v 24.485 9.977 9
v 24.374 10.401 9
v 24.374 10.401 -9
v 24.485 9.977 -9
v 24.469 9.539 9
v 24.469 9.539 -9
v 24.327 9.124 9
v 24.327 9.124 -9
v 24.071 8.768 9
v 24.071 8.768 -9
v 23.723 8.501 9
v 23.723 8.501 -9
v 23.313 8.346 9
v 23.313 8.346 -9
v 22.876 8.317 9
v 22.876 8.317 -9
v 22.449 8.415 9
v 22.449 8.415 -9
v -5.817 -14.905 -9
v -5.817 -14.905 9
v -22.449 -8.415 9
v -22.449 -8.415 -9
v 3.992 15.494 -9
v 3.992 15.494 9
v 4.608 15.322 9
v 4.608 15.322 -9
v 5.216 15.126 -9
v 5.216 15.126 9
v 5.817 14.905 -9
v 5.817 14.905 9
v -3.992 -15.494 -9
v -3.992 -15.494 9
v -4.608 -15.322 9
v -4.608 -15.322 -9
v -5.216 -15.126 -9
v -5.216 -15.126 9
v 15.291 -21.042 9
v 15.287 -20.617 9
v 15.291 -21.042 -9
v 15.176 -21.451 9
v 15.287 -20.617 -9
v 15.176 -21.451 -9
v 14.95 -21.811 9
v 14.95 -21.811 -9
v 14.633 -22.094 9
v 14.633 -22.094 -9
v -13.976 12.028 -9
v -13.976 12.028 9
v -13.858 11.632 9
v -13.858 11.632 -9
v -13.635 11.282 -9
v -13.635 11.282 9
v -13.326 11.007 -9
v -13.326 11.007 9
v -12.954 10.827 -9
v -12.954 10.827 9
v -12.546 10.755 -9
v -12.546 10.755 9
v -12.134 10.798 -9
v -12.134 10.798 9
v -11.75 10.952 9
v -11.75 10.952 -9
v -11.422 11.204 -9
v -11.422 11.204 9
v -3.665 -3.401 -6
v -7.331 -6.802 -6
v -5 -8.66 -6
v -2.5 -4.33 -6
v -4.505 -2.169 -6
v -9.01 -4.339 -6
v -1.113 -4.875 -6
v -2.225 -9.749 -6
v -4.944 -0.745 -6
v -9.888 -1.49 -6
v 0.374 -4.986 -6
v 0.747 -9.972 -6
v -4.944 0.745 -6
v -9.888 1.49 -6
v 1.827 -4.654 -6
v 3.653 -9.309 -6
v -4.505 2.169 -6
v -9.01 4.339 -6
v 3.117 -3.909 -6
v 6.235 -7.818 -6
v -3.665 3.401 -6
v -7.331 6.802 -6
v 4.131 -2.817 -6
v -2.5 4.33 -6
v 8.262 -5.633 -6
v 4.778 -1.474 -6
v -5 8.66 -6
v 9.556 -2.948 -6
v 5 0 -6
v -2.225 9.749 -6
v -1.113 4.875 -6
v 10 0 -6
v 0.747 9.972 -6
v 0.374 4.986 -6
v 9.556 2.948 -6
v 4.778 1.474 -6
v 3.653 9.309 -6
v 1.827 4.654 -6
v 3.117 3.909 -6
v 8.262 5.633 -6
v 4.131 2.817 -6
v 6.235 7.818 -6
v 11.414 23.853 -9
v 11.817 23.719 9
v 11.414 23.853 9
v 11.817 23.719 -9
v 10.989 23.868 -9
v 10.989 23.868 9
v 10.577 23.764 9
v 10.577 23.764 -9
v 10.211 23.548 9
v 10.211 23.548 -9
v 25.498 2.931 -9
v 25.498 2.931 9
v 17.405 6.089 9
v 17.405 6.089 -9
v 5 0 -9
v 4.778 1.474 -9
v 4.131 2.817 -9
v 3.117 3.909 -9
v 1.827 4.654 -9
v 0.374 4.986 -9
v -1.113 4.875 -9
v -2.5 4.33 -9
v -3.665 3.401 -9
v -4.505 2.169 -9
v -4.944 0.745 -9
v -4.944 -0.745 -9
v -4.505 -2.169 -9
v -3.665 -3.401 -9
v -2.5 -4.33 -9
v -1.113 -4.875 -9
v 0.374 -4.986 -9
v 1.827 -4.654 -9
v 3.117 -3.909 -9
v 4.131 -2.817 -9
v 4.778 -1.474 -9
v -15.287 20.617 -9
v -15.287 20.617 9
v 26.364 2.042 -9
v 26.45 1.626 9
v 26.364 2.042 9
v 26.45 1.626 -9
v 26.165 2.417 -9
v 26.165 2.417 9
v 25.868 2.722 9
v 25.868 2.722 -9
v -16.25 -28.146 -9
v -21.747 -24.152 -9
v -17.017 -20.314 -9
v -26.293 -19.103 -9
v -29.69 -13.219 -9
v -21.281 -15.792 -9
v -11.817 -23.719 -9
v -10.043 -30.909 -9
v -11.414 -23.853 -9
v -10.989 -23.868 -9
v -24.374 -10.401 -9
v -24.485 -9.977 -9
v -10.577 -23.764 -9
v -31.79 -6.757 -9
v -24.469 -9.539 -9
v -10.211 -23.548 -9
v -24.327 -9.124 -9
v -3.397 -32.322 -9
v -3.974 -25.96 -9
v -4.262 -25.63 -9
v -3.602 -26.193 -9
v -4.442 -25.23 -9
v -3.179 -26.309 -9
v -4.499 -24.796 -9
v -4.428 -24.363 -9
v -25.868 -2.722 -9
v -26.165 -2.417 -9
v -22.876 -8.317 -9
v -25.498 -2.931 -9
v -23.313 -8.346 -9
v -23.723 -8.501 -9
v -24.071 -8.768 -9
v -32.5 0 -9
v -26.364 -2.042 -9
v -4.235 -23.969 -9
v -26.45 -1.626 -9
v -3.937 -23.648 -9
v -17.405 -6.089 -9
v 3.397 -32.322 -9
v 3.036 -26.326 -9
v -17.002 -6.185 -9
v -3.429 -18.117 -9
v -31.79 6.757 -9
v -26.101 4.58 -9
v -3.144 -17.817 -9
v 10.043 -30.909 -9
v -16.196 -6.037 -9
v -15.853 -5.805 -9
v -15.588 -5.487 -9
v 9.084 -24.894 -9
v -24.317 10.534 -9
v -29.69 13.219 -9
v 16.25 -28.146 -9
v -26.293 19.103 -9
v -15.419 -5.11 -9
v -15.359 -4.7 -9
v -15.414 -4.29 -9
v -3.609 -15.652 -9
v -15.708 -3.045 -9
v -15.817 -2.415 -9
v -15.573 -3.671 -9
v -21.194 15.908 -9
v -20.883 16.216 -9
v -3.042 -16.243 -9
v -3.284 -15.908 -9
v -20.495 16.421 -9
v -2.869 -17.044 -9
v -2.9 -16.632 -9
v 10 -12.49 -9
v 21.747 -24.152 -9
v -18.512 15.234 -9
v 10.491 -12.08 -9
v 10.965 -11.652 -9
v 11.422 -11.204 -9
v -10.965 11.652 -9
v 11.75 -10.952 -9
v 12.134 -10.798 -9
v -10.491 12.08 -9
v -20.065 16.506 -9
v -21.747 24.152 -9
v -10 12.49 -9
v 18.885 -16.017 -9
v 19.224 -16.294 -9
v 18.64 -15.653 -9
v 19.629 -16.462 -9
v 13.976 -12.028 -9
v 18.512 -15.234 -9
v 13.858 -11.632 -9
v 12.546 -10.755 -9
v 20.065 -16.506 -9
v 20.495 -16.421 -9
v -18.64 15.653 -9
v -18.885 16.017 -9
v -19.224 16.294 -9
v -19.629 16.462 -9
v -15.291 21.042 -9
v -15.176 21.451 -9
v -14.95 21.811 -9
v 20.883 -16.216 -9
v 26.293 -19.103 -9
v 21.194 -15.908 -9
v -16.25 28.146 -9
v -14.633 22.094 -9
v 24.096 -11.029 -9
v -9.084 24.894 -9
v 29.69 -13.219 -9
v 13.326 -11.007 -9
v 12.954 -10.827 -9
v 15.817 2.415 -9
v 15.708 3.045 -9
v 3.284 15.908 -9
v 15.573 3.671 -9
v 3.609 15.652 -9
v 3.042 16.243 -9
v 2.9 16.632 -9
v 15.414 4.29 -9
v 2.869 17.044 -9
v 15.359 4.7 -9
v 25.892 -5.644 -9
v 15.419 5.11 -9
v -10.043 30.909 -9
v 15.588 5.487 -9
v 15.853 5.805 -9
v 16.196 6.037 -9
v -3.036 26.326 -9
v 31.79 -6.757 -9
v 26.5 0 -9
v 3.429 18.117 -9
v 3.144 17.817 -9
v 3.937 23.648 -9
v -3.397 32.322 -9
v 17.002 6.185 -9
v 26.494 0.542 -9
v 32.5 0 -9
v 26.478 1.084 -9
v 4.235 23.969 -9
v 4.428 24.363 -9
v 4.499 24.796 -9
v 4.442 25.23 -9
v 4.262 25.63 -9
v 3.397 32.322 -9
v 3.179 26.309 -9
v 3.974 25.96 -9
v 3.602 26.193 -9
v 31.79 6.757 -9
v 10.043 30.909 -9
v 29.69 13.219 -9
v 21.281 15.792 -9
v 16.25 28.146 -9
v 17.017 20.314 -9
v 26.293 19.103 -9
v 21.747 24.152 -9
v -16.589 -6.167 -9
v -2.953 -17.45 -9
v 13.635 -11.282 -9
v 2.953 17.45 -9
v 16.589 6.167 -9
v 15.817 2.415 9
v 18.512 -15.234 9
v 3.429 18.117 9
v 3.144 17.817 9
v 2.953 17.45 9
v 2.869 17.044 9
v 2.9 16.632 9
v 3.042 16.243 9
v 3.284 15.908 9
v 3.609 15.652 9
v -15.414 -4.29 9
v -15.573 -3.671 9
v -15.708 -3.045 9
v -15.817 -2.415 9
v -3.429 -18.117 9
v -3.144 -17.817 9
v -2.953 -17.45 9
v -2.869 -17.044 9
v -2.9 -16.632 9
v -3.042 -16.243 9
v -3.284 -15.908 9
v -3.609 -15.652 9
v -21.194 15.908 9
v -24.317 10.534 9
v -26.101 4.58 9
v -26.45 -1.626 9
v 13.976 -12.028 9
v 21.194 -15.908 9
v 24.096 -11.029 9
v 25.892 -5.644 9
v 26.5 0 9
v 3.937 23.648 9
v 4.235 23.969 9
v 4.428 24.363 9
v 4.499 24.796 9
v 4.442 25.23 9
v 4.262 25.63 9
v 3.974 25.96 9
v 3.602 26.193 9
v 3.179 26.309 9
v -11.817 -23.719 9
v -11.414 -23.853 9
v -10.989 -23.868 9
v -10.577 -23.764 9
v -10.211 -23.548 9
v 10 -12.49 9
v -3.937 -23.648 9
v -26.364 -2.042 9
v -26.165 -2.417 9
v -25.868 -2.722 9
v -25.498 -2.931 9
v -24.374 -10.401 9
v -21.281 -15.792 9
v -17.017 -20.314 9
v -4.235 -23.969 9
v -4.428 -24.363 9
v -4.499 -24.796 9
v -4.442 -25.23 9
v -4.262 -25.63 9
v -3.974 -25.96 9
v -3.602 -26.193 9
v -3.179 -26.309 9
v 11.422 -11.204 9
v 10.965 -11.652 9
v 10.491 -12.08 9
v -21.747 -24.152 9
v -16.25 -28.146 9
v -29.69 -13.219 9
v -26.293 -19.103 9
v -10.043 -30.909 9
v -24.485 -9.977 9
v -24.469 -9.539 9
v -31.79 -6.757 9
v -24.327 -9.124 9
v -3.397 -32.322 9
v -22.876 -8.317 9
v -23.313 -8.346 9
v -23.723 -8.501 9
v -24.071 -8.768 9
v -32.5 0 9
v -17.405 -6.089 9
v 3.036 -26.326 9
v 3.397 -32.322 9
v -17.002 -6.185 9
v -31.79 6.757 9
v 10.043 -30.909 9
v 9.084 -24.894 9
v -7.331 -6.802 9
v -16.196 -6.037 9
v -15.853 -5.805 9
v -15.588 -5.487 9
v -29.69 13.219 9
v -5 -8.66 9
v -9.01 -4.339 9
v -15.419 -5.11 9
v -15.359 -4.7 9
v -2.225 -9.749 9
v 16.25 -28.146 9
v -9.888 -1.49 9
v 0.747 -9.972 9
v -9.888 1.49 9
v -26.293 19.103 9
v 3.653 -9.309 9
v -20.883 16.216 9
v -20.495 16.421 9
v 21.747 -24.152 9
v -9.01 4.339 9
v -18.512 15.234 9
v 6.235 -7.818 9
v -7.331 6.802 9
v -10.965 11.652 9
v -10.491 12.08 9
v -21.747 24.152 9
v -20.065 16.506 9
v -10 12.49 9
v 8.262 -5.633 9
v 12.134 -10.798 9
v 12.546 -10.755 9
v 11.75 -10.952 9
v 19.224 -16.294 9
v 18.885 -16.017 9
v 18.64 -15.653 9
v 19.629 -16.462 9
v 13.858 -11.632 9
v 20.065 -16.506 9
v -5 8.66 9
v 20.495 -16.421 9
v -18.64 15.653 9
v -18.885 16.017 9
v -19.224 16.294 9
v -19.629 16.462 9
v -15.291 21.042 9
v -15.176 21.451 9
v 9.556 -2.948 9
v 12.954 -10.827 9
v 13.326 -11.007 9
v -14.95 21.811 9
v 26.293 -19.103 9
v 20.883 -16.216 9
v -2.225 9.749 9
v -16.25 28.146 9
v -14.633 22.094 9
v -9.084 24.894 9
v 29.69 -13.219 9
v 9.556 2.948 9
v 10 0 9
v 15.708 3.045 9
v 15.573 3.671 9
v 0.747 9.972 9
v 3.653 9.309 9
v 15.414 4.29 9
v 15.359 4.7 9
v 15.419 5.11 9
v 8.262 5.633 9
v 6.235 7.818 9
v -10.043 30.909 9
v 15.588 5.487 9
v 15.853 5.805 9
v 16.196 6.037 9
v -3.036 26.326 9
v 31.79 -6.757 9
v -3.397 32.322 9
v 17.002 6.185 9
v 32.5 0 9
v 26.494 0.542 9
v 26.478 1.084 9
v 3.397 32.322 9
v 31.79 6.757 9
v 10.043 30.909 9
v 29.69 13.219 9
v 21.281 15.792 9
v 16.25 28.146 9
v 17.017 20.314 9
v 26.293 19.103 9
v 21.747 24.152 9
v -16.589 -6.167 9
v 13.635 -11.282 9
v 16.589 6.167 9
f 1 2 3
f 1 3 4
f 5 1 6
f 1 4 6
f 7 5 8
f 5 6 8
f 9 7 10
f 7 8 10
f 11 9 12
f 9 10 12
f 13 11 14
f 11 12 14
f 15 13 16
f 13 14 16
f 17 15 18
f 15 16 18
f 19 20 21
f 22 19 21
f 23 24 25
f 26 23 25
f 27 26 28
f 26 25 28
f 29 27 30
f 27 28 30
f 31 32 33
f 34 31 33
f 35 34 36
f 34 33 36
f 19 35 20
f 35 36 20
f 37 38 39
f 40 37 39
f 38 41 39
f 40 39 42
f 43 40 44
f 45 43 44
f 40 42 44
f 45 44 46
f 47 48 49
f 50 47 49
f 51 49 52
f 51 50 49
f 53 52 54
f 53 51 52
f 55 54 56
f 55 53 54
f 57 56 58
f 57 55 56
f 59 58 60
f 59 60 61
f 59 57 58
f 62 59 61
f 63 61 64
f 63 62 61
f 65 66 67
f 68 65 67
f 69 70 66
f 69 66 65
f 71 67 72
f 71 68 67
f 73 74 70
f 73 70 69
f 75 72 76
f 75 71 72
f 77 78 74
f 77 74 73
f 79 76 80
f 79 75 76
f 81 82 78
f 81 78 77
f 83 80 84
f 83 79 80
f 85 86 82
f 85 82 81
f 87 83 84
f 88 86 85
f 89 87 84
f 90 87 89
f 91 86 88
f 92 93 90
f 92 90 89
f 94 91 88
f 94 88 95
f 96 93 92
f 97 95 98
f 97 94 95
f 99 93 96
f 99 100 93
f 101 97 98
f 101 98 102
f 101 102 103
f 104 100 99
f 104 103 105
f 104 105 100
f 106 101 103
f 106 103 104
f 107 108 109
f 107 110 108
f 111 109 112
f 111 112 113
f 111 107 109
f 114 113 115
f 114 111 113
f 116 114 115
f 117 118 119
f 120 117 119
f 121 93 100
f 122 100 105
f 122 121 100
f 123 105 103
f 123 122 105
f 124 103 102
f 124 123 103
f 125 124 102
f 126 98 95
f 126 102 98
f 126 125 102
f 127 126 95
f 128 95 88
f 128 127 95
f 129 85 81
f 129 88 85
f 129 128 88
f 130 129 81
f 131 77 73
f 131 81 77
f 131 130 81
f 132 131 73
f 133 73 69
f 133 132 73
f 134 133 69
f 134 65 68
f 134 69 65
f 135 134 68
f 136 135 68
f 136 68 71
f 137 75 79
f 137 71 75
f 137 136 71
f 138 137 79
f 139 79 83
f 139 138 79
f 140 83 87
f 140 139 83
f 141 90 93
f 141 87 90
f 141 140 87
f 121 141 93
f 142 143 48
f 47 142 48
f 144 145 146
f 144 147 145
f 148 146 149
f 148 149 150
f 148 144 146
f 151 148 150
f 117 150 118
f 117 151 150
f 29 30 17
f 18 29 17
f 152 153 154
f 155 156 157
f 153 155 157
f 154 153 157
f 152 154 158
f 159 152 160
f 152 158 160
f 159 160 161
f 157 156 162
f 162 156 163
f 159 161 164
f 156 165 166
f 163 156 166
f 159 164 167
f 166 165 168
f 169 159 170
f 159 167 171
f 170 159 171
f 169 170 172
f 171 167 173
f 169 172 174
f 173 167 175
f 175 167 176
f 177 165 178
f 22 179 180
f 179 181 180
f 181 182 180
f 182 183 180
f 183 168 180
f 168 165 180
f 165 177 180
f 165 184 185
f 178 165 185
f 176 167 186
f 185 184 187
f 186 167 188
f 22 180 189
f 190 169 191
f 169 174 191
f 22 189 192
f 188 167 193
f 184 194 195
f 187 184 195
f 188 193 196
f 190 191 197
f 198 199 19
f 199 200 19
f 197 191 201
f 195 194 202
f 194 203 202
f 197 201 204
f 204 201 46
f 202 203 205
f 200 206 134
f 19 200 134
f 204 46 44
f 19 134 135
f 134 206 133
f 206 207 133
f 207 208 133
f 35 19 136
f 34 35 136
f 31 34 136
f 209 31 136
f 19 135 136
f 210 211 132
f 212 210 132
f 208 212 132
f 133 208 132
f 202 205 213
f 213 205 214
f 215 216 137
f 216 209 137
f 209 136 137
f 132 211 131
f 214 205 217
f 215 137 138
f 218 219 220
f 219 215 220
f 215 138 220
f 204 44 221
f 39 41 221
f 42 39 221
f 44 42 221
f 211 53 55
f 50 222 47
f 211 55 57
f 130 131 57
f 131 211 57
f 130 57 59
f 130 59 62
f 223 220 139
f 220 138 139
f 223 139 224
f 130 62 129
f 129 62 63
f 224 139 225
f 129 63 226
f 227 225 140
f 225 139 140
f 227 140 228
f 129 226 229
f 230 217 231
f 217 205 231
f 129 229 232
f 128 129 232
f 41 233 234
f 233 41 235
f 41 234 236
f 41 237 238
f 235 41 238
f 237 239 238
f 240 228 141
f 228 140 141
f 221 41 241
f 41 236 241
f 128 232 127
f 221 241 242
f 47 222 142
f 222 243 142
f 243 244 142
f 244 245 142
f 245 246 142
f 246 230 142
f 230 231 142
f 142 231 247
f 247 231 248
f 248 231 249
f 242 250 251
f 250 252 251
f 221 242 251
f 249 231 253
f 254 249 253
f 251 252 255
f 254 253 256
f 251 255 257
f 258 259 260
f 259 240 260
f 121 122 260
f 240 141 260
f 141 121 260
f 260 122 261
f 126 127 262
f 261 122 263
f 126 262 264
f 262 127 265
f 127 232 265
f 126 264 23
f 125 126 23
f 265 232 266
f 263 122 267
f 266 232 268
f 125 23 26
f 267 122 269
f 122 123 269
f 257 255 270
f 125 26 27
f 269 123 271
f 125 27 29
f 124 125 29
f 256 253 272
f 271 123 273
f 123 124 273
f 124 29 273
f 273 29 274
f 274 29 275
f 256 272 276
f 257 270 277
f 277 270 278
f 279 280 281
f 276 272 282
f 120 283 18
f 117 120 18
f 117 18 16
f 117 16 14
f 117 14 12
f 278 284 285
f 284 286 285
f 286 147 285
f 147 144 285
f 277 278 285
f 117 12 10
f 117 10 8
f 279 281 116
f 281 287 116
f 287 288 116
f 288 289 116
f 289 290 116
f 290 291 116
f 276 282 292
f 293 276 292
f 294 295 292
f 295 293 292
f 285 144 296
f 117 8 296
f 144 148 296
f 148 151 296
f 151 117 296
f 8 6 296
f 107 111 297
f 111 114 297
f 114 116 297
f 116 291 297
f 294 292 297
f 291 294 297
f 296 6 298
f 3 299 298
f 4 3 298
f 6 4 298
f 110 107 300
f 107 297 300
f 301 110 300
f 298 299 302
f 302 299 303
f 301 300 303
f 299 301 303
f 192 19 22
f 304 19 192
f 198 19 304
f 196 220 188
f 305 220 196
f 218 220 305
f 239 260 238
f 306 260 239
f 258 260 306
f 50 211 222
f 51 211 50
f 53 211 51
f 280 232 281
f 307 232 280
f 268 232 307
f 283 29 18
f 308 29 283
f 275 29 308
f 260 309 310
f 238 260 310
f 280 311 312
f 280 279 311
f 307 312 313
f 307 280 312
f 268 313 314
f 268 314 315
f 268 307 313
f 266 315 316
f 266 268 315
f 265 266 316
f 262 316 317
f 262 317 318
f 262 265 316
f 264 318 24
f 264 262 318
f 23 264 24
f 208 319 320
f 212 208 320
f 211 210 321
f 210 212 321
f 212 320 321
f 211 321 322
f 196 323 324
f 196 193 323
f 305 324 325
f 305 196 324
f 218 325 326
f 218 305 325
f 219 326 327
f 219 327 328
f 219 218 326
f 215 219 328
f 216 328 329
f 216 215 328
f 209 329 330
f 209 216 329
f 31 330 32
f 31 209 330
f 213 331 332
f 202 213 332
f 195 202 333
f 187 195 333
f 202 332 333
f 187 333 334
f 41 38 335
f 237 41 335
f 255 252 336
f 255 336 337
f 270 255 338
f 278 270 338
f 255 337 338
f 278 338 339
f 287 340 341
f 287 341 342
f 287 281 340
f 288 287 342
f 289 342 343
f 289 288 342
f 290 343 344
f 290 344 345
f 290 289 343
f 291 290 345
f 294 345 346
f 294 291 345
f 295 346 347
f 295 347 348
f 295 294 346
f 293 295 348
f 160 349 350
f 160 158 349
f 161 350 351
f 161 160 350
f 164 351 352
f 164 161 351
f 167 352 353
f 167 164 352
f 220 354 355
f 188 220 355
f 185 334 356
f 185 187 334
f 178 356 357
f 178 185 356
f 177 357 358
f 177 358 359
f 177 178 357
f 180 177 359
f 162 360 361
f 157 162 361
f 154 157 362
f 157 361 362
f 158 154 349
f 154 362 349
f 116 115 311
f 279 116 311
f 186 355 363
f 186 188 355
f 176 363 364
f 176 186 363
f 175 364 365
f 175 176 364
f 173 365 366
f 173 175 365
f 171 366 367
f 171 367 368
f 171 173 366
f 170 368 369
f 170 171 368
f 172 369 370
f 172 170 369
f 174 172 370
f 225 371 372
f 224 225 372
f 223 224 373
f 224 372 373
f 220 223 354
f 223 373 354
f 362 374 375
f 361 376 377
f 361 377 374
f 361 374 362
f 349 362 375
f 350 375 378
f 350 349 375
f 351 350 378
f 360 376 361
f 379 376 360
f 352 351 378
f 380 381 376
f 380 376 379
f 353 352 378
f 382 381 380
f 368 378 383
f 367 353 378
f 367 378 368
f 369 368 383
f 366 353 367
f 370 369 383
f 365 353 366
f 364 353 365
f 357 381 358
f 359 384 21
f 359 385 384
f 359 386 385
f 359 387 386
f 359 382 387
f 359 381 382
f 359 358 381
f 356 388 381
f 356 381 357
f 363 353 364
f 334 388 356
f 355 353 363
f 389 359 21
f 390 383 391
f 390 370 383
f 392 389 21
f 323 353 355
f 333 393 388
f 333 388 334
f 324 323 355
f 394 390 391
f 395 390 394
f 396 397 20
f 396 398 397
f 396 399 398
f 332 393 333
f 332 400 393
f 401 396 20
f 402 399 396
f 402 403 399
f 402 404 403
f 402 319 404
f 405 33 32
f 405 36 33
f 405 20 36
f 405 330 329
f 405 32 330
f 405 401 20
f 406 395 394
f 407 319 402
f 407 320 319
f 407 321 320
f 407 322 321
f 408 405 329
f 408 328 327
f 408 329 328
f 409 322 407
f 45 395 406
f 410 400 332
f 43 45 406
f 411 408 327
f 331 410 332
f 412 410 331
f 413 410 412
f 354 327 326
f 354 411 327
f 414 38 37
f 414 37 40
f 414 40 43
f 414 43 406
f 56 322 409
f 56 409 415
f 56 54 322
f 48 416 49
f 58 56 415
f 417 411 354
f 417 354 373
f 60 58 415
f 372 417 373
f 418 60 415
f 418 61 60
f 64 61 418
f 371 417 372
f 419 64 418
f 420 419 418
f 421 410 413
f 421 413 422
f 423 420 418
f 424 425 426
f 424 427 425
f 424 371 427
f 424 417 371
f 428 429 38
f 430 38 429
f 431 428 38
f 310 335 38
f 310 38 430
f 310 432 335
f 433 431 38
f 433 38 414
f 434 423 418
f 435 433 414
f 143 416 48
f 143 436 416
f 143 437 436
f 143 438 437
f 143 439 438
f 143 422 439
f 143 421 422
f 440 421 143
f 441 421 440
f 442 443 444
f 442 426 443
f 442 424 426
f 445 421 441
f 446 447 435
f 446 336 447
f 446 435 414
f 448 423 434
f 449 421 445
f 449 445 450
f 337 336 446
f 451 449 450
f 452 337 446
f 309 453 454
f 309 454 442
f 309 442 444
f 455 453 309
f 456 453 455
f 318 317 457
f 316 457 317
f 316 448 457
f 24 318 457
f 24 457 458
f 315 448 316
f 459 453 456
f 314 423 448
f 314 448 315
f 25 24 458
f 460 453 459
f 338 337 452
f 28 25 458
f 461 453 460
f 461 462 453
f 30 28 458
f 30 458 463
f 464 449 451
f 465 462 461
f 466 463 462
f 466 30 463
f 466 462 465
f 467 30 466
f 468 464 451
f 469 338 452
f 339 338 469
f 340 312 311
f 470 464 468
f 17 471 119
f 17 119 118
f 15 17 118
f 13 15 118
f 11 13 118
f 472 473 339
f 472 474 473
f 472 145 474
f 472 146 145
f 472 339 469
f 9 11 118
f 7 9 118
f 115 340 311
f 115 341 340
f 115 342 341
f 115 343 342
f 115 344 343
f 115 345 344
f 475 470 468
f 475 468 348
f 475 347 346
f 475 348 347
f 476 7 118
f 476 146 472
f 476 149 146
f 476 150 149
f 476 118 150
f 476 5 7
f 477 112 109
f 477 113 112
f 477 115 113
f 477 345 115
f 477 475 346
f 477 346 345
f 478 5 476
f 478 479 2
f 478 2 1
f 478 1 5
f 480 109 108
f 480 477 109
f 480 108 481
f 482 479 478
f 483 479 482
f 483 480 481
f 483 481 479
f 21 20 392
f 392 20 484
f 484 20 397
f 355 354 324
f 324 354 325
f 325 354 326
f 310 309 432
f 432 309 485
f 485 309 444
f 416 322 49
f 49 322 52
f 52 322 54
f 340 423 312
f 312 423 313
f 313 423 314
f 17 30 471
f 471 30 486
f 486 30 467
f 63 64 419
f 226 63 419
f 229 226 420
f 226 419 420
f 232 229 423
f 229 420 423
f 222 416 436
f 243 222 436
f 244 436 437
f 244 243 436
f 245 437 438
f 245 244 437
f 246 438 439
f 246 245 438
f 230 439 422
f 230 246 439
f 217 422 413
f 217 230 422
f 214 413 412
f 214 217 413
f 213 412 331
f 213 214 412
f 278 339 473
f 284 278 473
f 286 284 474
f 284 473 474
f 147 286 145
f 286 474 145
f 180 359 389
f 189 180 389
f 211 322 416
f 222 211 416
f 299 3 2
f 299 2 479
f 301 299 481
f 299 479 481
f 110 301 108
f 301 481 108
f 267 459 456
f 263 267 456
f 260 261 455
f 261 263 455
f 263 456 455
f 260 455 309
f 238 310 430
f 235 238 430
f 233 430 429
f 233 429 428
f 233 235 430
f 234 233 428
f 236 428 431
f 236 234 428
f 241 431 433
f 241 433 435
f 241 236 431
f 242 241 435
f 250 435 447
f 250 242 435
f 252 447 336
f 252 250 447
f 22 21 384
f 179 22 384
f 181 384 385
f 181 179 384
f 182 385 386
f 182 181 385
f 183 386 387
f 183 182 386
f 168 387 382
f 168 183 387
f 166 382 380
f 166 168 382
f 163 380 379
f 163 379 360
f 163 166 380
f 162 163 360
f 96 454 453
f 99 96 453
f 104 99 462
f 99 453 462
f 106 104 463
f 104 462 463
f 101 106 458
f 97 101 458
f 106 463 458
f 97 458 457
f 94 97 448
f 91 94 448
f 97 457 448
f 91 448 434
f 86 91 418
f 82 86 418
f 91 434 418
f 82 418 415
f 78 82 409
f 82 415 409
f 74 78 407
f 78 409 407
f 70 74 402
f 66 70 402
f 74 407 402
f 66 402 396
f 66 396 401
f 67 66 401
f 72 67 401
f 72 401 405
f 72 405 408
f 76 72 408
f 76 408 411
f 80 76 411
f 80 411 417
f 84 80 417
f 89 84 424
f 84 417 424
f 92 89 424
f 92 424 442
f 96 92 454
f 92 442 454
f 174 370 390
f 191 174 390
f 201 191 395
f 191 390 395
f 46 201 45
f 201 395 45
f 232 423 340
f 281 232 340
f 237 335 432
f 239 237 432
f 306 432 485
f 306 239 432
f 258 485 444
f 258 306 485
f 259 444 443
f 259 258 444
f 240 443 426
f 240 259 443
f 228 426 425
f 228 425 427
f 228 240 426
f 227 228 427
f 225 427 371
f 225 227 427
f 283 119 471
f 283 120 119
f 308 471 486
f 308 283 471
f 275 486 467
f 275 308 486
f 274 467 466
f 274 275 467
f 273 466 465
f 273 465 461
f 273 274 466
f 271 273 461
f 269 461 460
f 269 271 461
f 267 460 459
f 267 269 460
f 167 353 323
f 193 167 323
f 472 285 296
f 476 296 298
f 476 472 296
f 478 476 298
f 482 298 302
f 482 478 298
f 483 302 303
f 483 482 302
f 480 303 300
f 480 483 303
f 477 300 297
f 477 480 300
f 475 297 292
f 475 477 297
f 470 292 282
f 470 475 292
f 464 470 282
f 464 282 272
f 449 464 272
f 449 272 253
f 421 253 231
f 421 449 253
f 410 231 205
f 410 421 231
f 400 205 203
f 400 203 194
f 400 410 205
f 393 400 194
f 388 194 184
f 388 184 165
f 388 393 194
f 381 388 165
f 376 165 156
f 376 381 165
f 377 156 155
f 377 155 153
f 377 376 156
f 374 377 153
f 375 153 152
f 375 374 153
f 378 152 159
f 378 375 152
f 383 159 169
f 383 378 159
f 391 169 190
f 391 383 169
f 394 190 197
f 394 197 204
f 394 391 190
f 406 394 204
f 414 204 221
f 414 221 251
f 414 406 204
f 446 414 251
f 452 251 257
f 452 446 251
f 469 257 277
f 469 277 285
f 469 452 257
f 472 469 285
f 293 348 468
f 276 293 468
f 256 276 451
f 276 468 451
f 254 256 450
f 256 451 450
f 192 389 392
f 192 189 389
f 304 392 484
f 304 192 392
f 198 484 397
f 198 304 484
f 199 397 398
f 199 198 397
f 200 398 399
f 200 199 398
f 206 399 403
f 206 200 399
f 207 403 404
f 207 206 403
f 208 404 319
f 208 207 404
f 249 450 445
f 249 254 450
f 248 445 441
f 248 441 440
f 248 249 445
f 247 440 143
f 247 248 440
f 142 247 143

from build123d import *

# Parameters (mm, degrees)
SKETCH_1_R          = 32.5
SKETCH_1_R_2        = 5
EXTRUDE_1_DEPTH     = 9
SKETCH_2_R          = 10
CUT_EXTRUDE_2_DEPTH = 15
CUT_EXTRUDE_3_DEPTH = 45
FILLET_1_R          = 1.5


with BuildPart() as part:
    # 草图1 → 凸台-拉伸1 (new, symmetric)
    with BuildSketch(Plane.XY):
        Circle(SKETCH_1_R)
        Circle(SKETCH_1_R_2, mode=Mode.SUBTRACT)
    extrude(amount=EXTRUDE_1_DEPTH, both=True)

    # 草图2 → 切除-拉伸2 (cut)
    with BuildSketch(Plane.XY.offset(9)):
        Circle(SKETCH_2_R)
    extrude(amount=-CUT_EXTRUDE_2_DEPTH, mode=Mode.SUBTRACT)

    # 草图3 → 切除-拉伸3 (cut)
    with BuildSketch(Plane.XY.offset(9)):
        with BuildLine():
            ThreePointArc((-13.460032078, 8.65029112), (-11.886088914, 10.710783834), (-10, 12.489995997))
            Line((-10, 12.489995997), (6.490409144, 25.692889856))
            ThreePointArc((6.490409144, 25.692889856), (-4.927079416, 26.037931723), (-15.429116278, 21.545124063))
            Line((-15.429116278, 21.545124063), (-13.460032078, 8.65029112))
        make_face()
        with BuildLine():
            ThreePointArc((25.495899884, 7.225585728), (20.085970626, 17.285941802), (10.944066627, 24.134568686))
            Line((10.944066627, 24.134568686), (0.761355821, 15.981875275))
            ThreePointArc((0.761355821, 15.981875275), (3.332766438, 15.649046868), (5.816653826, 14.905252036))
            Line((5.816653826, 14.905252036), (25.495899884, 7.225585728))
        make_face()
        with BuildLine():
            ThreePointArc((26.5, 0), (26.468276738, 1.296274087), (26.373182905, 2.589444623))
            Line((26.373182905, 2.589444623), (14.221387899, 7.331584155))
            ThreePointArc((14.221387899, 7.331584155), (15.218855351, 4.938263034), (15.816653826, 2.415256039))
            Line((15.816653826, 2.415256039), (19.005490739, -18.467304128))
            ThreePointArc((19.005490739, -18.467304128), (24.554994447, -9.965051315), (26.5, 0))
        make_face()
        with BuildLine():
            Line((15.429116278, -21.545124063), (13.460032078, -8.65029112))
            ThreePointArc((13.460032078, -8.65029112), (11.886088914, -10.710783834), (10, -12.489995997))
            Line((10, -12.489995997), (-6.490409144, -25.692889856))
            ThreePointArc((-6.490409144, -25.692889856), (4.927079416, -26.037931723), (15.429116278, -21.545124063))
        make_face()
        with BuildLine():
            Line((-5.816653826, -14.905252036), (-25.495899884, -7.225585728))
            ThreePointArc((-25.495899884, -7.225585728), (-20.085970626, -17.285941802), (-10.944066627, -24.134568686))
            Line((-10.944066627, -24.134568686), (-0.761355821, -15.981875275))
            ThreePointArc((-0.761355821, -15.981875275), (-3.332766438, -15.649046868), (-5.816653826, -14.905252036))
        make_face()
        with BuildLine():
            Line((-15.816653826, -2.415256039), (-19.005490739, 18.467304128))
            ThreePointArc((-19.005490739, 18.467304128), (-25.013050042, 8.751989921), (-26.373182905, -2.589444623))
            Line((-26.373182905, -2.589444623), (-14.221387899, -7.331584155))
            ThreePointArc((-14.221387899, -7.331584155), (-15.218855351, -4.938263034), (-15.816653826, -2.415256039))
        make_face()
    extrude(amount=-CUT_EXTRUDE_3_DEPTH, mode=Mode.SUBTRACT)

    # 圆角1
    fillet_1_edges = [part.edges().sort_by_distance(p)[0] for p in [
        (-6.490409144, -25.692889856, 0),
        (13.460032078, -8.65029112, 0),
        (15.429116278, -21.545124063, 0),
        (-25.495899884, -7.225585728, 0),
        (-0.761355821, -15.981875275, 0),
        (-10.944066627, -24.134568686, 0),
        (25.495899884, 7.225585728, 0),
        (0.761355821, 15.981875275, 0),
        (10.944066627, 24.134568686, 0),
        (19.005490739, -18.467304128, 0),
        (14.221387899, 7.331584155, 0),
        (26.373182905, 2.589444623, 0),
        (-19.005490739, 18.467304128, 0),
        (-14.221387899, -7.331584155, 0),
        (-26.373182905, -2.589444623, 0),
        (6.490409144, 25.692889856, 0),
        (-13.460032078, 8.65029112, 0),
        (-15.429116278, 21.545124063, 0),
    ]]
    fillet(fillet_1_edges, radius=FILLET_1_R)


solid = part.part
